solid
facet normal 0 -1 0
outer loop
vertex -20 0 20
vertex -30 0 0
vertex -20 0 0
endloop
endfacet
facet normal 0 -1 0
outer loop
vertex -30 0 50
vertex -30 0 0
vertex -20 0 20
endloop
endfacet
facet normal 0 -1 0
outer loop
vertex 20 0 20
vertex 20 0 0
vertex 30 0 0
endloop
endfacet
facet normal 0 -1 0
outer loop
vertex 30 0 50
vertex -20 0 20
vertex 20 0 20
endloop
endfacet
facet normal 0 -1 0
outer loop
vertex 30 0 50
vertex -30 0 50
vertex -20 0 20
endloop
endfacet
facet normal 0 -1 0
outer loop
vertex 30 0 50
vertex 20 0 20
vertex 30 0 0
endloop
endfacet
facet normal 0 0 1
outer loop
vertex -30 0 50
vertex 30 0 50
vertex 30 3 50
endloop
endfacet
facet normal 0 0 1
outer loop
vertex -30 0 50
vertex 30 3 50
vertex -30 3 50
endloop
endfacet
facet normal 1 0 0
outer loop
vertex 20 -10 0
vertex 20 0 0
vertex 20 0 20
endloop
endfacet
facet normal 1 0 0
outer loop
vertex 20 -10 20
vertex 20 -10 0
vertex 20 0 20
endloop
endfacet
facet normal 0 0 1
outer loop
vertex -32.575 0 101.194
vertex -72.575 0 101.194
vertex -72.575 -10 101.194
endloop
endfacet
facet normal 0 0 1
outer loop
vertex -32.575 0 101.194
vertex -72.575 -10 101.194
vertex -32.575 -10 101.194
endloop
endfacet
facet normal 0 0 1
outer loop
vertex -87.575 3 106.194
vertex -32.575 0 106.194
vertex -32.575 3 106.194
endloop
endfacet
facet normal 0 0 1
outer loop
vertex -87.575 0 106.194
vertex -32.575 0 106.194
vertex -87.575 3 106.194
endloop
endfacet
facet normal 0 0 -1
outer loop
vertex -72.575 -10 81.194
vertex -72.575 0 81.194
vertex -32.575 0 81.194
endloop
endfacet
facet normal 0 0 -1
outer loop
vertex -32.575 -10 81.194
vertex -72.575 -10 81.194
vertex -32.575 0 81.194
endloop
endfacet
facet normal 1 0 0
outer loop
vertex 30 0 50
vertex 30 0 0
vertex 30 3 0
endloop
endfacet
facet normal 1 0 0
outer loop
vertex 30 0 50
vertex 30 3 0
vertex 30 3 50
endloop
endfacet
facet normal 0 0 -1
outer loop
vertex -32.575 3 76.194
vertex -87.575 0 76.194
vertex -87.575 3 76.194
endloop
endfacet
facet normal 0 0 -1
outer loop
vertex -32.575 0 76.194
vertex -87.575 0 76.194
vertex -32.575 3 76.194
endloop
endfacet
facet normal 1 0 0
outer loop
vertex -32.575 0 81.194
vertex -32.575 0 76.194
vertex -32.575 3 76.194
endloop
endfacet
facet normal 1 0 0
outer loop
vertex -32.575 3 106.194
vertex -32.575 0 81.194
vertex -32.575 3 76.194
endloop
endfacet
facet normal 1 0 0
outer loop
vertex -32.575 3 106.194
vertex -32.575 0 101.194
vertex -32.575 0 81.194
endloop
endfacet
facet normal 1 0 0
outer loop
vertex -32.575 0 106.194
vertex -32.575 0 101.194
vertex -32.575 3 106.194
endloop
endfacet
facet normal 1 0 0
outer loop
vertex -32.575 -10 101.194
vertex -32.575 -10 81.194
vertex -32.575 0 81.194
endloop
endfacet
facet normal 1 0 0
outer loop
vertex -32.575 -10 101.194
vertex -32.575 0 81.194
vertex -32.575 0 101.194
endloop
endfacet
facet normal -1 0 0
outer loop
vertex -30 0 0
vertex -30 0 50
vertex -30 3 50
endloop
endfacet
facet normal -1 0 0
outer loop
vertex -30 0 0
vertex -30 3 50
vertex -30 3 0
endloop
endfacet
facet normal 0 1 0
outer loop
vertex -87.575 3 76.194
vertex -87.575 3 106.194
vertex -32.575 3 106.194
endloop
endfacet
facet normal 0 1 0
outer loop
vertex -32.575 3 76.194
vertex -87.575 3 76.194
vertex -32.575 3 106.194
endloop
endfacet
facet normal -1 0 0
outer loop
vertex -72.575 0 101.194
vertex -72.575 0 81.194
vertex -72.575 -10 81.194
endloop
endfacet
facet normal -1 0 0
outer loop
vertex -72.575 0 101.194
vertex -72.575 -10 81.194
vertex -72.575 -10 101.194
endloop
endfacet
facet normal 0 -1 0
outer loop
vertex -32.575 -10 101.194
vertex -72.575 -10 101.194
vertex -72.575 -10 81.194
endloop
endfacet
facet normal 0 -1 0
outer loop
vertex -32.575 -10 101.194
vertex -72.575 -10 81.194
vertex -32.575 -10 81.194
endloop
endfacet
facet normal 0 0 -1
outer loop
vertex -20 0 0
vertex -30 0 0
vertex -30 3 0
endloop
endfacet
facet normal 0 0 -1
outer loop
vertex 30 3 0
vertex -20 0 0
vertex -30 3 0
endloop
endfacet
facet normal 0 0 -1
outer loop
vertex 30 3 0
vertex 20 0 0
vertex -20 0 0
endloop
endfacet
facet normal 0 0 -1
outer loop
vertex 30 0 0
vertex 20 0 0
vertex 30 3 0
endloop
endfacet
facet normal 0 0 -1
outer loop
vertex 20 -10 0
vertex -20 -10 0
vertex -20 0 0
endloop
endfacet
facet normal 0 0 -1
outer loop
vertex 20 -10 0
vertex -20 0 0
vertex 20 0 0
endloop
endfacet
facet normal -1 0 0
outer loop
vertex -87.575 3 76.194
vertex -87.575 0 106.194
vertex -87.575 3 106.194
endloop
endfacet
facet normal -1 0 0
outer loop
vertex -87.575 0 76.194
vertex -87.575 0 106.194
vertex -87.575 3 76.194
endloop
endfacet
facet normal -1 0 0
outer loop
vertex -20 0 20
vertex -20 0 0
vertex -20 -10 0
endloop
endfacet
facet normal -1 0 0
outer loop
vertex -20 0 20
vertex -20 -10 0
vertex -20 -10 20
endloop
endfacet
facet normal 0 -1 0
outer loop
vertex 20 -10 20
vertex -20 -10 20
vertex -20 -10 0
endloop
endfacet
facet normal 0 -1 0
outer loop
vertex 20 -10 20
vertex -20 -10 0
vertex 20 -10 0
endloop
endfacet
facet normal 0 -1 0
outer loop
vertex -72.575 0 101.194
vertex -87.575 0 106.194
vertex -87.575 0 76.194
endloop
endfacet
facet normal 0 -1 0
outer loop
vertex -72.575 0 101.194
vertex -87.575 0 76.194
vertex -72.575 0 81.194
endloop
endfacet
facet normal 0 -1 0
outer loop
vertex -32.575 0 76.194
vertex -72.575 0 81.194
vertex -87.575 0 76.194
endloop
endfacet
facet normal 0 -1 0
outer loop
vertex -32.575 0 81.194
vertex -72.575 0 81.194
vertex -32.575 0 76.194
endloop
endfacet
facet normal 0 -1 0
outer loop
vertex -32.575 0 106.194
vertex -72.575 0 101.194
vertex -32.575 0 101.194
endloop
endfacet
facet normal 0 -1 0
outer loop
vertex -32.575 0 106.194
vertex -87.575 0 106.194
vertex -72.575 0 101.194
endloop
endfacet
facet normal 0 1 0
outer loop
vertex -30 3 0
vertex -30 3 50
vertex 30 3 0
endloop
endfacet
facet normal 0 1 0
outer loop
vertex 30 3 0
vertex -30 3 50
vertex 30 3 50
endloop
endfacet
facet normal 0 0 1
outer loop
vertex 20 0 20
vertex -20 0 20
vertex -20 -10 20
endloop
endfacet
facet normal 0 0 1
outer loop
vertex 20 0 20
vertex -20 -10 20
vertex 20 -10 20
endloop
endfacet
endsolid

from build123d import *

# Parameters (mm, degrees)
F0_W     = 40
F0_H     = 20
F1_W     = 40
F1_H     = 20
F2_DEPTH = 3
F3_DEPTH = 10


with BuildPart() as f2:
    # F0 (on Front) + F1 (on Front) → F2 (new body)
    with BuildSketch(Plane.XZ):
        Polygon((30, 50), (-30, 50), (-30, 0), (-20, 0), (-20, 20), (20, 20), (20, 0), (30, 0), align=None)
        with Locations((0, 10)):
            Rectangle(F0_W, F0_H)
    with BuildSketch(Plane.XZ):
        Polygon((-32.57548, 106.193823), (-87.57548, 106.193823), (-87.57548, 76.193823), (-32.57548, 76.193823), (-32.57548, 81.193823), (-72.57548, 81.193823), (-72.57548, 101.193823), (-32.57548, 101.193823), align=None)
        with Locations((-52.57548, 91.193823)):
            Rectangle(F1_W, F1_H)
    extrude(amount=-F2_DEPTH)

    # F0 (on Front) + F1 (on Front) → F3 (join)
    with BuildSketch(Plane.XZ):
        with Locations((0, 10)):
            Rectangle(F0_W, F0_H)
    with BuildSketch(Plane.XZ):
        with Locations((-52.57548, 91.193823)):
            Rectangle(F1_W, F1_H)
    extrude(amount=F3_DEPTH)


solid = f2.part
